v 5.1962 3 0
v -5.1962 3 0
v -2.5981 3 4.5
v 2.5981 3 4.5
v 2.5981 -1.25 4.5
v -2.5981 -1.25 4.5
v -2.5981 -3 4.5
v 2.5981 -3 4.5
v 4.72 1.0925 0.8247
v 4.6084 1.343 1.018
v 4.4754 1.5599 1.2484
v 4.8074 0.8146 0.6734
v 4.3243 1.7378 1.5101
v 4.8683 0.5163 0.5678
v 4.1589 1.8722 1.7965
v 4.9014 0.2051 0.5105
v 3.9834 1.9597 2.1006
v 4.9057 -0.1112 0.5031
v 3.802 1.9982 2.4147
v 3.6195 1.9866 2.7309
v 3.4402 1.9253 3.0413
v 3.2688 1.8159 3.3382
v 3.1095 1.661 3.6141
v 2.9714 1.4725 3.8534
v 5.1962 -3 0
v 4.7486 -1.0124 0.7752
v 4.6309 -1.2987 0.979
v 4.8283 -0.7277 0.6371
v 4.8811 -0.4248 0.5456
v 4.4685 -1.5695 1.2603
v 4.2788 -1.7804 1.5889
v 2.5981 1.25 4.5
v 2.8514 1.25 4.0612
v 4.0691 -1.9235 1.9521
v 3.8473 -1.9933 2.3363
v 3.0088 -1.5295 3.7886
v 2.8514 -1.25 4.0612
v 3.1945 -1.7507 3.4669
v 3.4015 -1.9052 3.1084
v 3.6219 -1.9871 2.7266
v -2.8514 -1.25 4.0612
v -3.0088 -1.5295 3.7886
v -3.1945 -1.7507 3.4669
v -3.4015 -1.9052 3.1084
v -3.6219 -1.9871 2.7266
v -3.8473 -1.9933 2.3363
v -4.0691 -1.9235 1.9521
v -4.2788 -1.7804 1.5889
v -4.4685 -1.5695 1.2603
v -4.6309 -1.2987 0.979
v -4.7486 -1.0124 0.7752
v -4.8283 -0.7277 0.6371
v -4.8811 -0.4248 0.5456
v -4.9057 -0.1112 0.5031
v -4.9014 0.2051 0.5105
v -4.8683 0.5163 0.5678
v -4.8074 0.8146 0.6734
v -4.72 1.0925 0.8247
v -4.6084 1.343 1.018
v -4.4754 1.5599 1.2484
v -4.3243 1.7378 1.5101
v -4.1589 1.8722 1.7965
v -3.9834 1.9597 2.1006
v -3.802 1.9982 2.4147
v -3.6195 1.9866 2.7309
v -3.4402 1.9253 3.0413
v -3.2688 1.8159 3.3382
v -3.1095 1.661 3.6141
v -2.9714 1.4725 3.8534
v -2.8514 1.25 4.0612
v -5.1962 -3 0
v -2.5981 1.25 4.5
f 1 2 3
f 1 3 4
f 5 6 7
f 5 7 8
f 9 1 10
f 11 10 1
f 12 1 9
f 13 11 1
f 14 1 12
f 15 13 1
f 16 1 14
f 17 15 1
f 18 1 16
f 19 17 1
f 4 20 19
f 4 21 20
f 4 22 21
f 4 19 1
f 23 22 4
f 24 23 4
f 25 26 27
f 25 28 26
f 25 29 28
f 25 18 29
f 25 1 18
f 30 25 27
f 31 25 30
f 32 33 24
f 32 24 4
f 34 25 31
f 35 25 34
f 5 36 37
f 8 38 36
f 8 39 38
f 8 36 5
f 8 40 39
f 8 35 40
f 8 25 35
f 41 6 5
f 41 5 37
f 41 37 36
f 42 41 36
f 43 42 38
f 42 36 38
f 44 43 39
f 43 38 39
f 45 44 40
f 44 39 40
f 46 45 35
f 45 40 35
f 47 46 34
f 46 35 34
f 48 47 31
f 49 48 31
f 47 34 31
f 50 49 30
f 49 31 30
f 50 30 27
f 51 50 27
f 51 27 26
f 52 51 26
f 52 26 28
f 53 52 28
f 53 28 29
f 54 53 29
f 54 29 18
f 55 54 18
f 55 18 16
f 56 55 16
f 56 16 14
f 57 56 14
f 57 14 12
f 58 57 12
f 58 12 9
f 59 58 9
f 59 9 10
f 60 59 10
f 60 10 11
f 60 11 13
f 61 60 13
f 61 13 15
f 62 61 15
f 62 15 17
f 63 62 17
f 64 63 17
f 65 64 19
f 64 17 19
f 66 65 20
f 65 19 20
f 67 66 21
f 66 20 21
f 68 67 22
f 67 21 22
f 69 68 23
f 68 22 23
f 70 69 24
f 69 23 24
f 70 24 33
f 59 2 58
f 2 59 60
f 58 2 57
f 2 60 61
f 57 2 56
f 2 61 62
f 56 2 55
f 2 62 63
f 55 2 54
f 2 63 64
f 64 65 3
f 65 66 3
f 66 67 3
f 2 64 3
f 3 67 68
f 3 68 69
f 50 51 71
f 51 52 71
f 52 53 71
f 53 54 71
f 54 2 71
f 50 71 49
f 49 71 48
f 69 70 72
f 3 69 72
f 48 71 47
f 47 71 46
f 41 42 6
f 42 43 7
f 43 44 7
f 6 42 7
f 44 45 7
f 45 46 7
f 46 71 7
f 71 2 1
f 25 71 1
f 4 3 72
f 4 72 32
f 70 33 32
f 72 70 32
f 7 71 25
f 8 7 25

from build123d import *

# Parameters (mm, degrees)
SKETCH8_W           = 10.392304846
SKETCH8_H           = 6
BOSS_EXTRUDE3_DEPTH = 4.5
CUT_EXTRUDE5_DEPTH  = 11.392304845
CUT_EXTRUDE6_DEPTH  = 7


with BuildPart() as part:
    # Sketch8 → Boss-Extrude3 (new body)
    with BuildSketch(Plane.XY):
        Rectangle(SKETCH8_W, SKETCH8_H)
    extrude(amount=BOSS_EXTRUDE3_DEPTH)

    # Sketch9 → Cut-Extrude5 (cut, through all)
    with BuildSketch(Plane(origin=(5.196152423, 0, 0), x_dir=(0, 0, -1), z_dir=(1, 0, 0))):
        with BuildLine():
            Line((-4.0612495, 1.25), (-4.5, 1.25))
            Line((-4.5, 1.25), (-4.5, -1.25))
            Line((-4.5, -1.25), (-4.0612495, -1.25))
            ThreePointArc((-4.0612495, -1.25), (-0.5, 0), (-4.0612495, 1.25))
        make_face()
    extrude(amount=-CUT_EXTRUDE5_DEPTH, mode=Mode.SUBTRACT)

    # Sketch10 → Cut-Extrude6 (cut, through all)
    with BuildSketch(Plane.XZ.offset(3)):
        Polygon((5.196152423, 0), (2.598076211, 4.5), (5.196152423, 4.5), align=None)
        Polygon((-5.196152423, 4.5), (-5.196152423, 0), (-2.598076211, 4.5), align=None)
    extrude(amount=-CUT_EXTRUDE6_DEPTH, mode=Mode.SUBTRACT)


solid = part.part
